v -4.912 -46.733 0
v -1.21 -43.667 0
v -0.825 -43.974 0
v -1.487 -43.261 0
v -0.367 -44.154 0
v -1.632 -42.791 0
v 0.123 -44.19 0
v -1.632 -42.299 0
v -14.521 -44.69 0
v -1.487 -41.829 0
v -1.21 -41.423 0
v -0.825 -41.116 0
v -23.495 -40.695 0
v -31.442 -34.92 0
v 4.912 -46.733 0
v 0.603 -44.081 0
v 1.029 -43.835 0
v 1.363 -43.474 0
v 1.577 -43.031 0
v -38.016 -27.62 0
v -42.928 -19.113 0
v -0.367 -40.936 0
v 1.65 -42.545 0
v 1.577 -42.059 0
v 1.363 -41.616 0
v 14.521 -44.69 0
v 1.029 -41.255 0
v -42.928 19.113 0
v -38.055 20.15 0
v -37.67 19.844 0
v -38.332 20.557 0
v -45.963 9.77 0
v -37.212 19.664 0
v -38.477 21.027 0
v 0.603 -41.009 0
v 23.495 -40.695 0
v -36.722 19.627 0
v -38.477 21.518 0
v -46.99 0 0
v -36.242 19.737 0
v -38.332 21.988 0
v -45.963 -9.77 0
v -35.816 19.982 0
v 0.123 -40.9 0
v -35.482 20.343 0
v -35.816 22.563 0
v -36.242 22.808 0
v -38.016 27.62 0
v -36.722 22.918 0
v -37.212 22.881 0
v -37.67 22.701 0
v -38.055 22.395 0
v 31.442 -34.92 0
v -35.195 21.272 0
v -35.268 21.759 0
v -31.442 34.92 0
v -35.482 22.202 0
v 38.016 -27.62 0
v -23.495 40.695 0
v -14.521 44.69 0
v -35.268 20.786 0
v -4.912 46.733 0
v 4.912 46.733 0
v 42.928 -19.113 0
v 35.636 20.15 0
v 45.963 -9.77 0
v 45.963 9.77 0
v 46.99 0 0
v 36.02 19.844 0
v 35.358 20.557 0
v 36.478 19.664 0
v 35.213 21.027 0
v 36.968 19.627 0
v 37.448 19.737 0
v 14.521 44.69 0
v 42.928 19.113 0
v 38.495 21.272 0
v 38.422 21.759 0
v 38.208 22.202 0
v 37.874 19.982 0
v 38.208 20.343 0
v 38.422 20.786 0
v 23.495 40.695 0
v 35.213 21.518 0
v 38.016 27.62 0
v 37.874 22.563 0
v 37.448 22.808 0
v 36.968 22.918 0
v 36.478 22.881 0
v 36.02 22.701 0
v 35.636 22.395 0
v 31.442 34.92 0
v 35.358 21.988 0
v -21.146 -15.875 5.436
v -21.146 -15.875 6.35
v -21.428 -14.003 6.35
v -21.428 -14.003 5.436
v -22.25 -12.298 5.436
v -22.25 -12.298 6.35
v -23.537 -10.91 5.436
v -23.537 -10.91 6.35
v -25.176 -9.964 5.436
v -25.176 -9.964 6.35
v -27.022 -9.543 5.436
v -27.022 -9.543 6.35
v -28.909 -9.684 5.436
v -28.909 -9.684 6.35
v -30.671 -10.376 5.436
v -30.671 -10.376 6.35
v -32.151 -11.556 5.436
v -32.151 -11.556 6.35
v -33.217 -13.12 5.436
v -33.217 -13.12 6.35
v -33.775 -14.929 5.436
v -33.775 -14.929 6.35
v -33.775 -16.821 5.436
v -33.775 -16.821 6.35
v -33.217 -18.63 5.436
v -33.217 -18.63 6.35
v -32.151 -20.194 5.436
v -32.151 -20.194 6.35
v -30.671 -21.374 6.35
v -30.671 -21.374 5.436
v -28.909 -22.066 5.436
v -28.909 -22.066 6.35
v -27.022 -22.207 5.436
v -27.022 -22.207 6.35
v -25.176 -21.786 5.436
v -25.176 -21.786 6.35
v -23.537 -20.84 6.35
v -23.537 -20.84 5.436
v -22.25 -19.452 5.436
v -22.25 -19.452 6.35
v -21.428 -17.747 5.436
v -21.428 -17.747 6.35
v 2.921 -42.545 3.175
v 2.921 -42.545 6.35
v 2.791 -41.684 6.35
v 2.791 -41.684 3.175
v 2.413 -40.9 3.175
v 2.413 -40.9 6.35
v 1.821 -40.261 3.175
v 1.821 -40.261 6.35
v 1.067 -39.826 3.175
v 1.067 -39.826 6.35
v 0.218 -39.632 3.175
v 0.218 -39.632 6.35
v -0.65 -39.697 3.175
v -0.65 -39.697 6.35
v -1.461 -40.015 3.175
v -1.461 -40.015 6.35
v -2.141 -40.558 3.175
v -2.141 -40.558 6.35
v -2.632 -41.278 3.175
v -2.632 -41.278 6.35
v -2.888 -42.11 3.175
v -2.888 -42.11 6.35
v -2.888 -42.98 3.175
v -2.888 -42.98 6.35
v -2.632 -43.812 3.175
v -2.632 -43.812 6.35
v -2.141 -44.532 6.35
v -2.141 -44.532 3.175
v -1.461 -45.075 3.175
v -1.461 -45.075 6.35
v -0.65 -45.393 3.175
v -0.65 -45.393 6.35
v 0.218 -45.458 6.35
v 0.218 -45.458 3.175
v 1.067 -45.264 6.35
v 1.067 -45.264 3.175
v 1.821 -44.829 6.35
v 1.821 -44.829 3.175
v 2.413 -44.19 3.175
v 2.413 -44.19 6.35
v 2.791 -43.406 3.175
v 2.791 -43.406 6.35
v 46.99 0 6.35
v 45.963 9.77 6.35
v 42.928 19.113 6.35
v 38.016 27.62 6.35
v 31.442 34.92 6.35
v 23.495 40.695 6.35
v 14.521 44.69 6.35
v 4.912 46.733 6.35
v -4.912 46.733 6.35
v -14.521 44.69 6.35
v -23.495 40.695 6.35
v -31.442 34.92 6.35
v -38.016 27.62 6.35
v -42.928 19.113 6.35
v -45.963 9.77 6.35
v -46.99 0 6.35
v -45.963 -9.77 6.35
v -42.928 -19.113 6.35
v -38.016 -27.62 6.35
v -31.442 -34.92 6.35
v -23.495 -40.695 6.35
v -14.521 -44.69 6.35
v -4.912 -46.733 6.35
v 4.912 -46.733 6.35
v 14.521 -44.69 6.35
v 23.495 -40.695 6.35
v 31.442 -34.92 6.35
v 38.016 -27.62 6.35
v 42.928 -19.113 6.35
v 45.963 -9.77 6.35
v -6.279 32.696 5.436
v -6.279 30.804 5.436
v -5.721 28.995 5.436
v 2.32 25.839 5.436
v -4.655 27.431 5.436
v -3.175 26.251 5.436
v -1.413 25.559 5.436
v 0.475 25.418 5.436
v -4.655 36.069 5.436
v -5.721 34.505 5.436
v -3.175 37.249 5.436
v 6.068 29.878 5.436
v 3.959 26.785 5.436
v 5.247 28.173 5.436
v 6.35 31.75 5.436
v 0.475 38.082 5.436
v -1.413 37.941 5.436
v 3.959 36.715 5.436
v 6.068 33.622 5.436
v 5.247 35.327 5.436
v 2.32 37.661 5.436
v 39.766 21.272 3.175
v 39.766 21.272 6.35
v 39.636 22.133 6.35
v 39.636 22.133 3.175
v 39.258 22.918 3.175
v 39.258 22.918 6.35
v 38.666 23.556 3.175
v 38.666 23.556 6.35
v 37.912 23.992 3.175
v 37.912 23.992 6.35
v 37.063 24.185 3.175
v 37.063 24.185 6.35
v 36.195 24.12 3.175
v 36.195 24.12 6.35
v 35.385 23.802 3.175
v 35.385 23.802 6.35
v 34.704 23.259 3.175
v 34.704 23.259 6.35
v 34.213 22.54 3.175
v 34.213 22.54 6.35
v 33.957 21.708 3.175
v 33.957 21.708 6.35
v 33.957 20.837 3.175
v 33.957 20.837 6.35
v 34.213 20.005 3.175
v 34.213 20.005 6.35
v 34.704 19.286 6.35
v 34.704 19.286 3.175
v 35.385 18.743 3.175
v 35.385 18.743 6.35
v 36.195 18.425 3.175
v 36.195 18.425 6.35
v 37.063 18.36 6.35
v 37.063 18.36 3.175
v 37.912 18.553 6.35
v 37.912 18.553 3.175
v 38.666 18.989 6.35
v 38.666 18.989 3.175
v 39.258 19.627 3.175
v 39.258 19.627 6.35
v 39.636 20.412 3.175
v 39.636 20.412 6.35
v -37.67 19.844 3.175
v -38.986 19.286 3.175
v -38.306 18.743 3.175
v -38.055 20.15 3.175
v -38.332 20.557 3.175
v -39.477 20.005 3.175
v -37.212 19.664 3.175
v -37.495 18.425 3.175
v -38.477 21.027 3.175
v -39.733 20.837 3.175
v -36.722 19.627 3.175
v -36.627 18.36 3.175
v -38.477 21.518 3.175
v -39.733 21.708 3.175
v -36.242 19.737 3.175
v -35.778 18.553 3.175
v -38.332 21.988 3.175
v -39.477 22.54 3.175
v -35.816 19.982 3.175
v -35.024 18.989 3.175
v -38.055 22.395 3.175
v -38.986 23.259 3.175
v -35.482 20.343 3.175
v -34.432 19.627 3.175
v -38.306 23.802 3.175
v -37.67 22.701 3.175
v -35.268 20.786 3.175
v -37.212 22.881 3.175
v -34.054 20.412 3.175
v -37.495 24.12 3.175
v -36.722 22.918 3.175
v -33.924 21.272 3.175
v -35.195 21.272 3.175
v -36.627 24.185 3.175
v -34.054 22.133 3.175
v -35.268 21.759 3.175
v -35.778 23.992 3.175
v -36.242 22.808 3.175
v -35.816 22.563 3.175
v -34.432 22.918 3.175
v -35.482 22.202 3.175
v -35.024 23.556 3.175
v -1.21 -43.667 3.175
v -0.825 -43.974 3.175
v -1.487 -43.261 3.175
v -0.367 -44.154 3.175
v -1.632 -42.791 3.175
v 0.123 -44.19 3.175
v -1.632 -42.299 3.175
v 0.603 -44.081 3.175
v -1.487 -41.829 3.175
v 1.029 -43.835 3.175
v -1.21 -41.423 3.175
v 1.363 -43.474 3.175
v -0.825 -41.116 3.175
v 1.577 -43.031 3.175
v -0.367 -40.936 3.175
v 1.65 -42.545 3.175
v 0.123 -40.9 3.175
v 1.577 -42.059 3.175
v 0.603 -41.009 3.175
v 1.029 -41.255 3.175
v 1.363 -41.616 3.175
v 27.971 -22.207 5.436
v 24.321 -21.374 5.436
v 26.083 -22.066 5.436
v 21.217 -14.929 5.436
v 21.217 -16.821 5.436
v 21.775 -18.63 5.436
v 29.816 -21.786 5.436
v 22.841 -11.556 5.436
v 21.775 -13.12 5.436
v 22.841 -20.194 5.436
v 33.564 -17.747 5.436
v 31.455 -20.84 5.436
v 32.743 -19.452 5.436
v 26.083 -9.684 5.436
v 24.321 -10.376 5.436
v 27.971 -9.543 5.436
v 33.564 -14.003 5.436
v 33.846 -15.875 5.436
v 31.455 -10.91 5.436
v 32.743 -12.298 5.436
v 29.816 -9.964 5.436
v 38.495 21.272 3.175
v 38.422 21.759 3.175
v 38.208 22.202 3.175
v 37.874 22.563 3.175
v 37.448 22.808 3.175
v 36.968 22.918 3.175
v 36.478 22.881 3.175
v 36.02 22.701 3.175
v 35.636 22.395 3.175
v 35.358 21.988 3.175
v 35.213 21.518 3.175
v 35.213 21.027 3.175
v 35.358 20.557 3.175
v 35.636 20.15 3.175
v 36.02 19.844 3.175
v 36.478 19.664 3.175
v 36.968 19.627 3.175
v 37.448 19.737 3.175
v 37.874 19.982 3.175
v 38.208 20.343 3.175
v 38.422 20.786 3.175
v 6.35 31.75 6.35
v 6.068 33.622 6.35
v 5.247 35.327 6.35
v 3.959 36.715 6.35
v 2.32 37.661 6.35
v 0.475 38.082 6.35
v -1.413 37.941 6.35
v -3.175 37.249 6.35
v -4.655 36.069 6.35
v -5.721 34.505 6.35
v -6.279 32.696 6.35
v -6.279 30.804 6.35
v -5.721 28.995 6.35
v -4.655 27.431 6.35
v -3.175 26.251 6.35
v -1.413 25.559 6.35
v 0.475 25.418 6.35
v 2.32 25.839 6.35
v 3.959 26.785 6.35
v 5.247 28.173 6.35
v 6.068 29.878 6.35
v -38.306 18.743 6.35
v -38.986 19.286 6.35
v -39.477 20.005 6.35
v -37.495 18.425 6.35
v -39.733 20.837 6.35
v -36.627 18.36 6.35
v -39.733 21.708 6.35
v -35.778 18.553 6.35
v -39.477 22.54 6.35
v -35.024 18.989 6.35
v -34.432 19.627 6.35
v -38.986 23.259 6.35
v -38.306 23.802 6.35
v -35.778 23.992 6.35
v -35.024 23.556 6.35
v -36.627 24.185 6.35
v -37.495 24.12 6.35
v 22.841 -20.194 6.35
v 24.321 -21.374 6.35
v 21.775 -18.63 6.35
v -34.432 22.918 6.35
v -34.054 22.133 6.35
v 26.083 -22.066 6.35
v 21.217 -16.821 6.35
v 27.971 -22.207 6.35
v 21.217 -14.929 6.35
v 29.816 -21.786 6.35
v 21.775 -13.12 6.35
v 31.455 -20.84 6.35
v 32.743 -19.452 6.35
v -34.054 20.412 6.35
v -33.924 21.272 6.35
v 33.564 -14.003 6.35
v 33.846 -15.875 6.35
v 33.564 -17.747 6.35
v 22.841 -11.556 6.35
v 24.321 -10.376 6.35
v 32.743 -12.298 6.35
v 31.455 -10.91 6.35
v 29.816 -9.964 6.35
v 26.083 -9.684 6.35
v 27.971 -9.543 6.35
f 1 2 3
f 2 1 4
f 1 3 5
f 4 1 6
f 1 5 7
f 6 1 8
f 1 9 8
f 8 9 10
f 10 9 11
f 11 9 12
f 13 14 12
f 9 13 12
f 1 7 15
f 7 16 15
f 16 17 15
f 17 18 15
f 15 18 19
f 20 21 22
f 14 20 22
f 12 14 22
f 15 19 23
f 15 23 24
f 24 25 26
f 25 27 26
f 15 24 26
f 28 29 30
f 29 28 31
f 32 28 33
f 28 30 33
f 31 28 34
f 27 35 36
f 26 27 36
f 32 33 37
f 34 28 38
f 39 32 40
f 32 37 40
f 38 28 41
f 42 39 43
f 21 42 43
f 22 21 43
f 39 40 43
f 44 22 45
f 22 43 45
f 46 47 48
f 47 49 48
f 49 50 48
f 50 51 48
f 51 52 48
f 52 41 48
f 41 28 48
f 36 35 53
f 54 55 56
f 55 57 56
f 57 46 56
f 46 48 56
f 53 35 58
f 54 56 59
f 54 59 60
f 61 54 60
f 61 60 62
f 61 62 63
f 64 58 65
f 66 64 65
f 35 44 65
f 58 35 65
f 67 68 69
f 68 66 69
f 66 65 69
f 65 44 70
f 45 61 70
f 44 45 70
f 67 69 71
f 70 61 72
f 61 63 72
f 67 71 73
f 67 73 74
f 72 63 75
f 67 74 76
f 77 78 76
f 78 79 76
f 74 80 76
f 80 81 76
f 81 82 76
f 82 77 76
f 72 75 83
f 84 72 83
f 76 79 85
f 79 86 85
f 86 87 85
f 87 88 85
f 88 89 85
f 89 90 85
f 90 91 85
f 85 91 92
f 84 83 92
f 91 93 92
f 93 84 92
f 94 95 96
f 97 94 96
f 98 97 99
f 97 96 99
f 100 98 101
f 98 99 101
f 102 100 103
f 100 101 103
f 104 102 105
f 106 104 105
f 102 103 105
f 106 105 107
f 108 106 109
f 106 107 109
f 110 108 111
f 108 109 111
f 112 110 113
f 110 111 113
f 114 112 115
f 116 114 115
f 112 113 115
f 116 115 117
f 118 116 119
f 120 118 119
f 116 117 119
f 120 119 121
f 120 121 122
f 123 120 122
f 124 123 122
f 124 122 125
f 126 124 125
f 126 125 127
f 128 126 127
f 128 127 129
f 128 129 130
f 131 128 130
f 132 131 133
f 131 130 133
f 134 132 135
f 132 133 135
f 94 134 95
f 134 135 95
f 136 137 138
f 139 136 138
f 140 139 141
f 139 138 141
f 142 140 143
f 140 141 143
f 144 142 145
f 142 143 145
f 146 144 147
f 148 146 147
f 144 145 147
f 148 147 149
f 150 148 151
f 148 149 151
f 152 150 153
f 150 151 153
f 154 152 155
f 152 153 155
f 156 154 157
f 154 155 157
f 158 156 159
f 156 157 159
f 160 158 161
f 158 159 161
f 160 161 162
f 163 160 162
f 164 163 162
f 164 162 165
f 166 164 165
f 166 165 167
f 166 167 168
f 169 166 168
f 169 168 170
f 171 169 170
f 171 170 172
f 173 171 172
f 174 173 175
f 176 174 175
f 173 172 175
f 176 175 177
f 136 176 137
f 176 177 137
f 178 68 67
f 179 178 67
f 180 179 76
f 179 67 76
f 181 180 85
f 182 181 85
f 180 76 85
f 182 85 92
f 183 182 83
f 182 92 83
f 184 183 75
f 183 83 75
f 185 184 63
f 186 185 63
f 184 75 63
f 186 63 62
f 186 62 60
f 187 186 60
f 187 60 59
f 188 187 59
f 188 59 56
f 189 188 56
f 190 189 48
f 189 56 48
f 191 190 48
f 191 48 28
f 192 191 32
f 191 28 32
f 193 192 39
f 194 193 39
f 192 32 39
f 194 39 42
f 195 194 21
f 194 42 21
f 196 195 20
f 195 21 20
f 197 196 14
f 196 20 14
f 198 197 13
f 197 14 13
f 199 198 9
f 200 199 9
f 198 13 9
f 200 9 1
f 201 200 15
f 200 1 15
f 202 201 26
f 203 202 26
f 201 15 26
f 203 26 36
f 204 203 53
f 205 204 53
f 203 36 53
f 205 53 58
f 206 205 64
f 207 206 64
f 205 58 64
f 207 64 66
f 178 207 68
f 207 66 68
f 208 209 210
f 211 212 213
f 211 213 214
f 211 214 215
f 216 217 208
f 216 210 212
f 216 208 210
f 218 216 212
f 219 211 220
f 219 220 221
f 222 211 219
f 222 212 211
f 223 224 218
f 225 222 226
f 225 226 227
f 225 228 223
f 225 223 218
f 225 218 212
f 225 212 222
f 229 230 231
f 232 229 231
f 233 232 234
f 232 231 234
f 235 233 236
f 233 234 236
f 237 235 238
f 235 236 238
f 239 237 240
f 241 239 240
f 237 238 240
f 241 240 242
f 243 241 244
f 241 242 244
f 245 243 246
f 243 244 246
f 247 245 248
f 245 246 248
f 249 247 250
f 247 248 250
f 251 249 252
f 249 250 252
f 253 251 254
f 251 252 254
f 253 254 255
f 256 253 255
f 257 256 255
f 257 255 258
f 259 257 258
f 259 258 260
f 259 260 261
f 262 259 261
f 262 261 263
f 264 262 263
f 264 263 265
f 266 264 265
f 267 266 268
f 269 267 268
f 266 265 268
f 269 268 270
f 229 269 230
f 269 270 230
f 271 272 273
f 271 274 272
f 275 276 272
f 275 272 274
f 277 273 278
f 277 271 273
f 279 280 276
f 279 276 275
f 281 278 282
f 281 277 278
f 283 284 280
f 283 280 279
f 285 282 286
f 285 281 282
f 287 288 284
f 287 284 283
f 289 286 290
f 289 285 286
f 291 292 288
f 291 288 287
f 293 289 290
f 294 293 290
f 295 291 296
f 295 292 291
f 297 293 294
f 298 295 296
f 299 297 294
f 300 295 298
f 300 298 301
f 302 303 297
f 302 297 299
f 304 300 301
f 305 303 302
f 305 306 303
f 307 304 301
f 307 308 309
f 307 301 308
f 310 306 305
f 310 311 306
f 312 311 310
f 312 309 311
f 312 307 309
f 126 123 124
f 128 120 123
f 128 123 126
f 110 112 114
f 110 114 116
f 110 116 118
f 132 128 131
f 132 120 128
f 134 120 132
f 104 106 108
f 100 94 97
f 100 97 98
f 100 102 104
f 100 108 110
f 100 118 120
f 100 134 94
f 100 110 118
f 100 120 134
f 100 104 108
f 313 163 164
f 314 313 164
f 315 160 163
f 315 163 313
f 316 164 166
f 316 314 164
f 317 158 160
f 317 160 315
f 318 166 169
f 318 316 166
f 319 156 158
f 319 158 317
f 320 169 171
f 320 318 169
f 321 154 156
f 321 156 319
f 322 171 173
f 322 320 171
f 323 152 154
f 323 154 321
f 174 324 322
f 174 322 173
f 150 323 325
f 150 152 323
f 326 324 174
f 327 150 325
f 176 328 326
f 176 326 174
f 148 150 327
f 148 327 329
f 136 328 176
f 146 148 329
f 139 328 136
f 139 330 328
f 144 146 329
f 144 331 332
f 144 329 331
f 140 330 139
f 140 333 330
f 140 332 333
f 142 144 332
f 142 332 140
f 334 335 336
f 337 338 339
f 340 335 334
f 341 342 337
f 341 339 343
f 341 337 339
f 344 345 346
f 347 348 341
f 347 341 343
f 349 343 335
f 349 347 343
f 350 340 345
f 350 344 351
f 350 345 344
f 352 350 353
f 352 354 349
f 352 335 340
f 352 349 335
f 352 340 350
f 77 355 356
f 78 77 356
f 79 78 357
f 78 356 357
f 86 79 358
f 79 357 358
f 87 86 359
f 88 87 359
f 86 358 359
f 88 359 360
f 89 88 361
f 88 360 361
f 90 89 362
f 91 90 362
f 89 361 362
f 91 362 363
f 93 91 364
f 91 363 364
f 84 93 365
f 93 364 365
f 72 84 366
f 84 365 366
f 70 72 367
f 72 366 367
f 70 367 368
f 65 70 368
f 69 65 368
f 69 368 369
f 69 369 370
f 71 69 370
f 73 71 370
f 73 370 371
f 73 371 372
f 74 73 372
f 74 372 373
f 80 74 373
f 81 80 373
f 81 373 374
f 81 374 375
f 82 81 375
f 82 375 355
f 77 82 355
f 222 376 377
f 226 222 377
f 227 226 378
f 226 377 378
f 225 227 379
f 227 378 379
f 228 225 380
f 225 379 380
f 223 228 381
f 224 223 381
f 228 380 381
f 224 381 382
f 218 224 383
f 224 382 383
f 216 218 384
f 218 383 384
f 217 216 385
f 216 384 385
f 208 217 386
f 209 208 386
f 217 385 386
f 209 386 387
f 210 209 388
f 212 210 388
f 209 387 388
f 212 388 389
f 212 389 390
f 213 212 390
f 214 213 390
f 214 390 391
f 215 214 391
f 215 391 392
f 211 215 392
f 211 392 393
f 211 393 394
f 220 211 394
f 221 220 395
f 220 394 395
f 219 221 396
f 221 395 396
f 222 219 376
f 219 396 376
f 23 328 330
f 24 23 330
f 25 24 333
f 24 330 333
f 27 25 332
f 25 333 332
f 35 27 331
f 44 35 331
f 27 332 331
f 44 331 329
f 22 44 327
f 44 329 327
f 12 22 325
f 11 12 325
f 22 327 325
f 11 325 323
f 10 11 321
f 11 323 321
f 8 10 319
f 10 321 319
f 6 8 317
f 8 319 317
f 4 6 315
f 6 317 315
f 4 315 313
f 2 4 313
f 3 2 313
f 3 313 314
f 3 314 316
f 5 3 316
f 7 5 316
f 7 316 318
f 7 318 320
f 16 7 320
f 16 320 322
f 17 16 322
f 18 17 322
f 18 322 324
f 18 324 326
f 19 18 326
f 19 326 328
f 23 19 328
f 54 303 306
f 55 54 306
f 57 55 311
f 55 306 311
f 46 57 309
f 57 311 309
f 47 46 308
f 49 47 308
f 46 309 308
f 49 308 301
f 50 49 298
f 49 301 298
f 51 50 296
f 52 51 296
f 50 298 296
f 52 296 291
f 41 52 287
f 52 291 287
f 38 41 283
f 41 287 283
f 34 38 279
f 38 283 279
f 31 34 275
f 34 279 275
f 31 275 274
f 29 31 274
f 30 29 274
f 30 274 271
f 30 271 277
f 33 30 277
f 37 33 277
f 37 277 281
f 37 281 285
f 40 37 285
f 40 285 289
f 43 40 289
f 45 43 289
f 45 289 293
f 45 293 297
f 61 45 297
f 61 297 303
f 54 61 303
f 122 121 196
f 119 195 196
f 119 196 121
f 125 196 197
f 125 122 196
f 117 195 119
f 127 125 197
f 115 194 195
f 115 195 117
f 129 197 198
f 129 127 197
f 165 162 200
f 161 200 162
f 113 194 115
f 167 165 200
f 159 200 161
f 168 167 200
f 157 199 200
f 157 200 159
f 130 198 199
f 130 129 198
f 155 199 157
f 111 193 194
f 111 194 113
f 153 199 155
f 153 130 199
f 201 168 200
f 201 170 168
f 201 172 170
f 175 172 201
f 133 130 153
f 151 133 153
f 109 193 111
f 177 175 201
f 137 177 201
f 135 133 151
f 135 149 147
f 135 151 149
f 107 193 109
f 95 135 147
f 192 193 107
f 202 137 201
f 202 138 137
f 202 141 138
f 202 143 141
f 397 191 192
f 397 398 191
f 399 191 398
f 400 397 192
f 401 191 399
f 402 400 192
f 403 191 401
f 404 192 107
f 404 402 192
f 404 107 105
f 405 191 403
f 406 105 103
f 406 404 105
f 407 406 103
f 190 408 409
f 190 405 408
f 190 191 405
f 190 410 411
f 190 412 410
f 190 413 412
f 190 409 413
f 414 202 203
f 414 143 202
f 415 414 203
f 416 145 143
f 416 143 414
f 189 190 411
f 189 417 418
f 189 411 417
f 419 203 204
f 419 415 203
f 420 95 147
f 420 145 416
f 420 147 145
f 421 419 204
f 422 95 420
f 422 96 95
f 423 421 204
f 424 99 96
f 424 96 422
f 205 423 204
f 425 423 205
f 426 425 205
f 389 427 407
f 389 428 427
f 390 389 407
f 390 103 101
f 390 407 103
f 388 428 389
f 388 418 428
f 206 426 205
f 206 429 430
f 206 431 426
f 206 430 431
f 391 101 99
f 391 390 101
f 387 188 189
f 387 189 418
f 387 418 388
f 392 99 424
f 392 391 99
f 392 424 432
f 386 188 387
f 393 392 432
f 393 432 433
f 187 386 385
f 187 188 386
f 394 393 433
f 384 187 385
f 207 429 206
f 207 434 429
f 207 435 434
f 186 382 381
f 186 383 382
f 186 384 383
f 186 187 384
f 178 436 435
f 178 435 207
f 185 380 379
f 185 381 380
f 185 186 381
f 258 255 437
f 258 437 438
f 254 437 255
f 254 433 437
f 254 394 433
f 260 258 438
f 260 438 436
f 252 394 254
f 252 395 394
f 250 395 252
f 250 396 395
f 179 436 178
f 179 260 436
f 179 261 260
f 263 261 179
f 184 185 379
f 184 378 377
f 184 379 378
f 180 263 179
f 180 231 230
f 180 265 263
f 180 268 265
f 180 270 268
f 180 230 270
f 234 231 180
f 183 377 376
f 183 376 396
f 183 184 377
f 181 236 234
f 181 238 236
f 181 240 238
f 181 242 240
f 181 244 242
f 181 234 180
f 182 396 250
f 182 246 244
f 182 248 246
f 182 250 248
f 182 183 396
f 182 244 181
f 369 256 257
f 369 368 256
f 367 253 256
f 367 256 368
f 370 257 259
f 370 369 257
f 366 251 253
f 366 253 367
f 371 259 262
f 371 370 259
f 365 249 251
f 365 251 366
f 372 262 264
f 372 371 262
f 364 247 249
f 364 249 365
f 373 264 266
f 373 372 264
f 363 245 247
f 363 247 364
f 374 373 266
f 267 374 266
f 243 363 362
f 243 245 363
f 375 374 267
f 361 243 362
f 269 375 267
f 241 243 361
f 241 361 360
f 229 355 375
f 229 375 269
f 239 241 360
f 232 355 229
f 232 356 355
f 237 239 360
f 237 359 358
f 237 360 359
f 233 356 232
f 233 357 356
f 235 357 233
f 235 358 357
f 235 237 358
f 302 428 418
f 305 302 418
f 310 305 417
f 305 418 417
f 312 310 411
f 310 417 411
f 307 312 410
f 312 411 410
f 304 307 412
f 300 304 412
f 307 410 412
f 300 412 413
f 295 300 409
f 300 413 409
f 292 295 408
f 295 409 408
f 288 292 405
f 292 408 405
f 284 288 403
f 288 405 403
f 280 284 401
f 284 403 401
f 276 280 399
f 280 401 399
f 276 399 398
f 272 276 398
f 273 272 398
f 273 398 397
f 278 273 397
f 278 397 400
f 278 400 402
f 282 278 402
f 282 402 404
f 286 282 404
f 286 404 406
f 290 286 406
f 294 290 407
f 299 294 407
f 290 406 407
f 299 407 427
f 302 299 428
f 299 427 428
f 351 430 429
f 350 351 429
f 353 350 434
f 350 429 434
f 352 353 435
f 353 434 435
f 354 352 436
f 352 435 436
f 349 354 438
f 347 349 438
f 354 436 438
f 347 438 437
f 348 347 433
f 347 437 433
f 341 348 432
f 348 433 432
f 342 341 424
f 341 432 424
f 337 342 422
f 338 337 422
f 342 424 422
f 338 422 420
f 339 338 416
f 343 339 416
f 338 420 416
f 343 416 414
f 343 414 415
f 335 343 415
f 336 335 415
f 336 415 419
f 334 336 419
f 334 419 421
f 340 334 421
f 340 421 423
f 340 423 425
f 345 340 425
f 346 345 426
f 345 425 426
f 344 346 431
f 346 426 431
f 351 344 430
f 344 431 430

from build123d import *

# Parameters (mm, degrees)
F0_R     = 46.99
F1_DEPTH = 6.35
F2_R     = 6.35
F3_DEPTH = 0.9144
F4_R     = 2.921
F5_DEPTH = 3.175
F6_R     = 1.65
F7_DEPTH = 25.4


with BuildPart() as f1:
    # F0 (on Top) → F1 (new body)
    with BuildSketch(Plane.XY):
        Circle(F0_R)
    extrude(amount=F1_DEPTH)

    # F2 (on face) → F3 (cut)
    with BuildSketch(Plane.XY.offset(6.35)):
        with Locations((0, 31.75)):
            Circle(F2_R)
        with Locations((-27.496307, -15.875)):
            Circle(F2_R)
        with Locations((27.496307, -15.875)):
            Circle(F2_R)
    extrude(amount=-F3_DEPTH, mode=Mode.SUBTRACT)

    # F4 (on face) → F5 (cut)
    with BuildSketch(Plane.XY.offset(6.35)):
        with Locations((0, -42.545)):
            Circle(F4_R)
        with Locations((-36.845051, 21.2725)):
            Circle(F4_R)
        with Locations((36.845051, 21.2725)):
            Circle(F4_R)
    extrude(amount=-F5_DEPTH, mode=Mode.SUBTRACT)

    # F6 (on face) → F7 (cut)
    with BuildSketch(Plane.XY.offset(6.35)):
        with Locations((-36.845051, 21.2725)):
            Circle(F6_R)
        with Locations((36.845051, 21.2725)):
            Circle(F6_R)
        with Locations((0, -42.545)):
            Circle(F6_R)
    extrude(amount=-F7_DEPTH, mode=Mode.SUBTRACT)


solid = f1.part
